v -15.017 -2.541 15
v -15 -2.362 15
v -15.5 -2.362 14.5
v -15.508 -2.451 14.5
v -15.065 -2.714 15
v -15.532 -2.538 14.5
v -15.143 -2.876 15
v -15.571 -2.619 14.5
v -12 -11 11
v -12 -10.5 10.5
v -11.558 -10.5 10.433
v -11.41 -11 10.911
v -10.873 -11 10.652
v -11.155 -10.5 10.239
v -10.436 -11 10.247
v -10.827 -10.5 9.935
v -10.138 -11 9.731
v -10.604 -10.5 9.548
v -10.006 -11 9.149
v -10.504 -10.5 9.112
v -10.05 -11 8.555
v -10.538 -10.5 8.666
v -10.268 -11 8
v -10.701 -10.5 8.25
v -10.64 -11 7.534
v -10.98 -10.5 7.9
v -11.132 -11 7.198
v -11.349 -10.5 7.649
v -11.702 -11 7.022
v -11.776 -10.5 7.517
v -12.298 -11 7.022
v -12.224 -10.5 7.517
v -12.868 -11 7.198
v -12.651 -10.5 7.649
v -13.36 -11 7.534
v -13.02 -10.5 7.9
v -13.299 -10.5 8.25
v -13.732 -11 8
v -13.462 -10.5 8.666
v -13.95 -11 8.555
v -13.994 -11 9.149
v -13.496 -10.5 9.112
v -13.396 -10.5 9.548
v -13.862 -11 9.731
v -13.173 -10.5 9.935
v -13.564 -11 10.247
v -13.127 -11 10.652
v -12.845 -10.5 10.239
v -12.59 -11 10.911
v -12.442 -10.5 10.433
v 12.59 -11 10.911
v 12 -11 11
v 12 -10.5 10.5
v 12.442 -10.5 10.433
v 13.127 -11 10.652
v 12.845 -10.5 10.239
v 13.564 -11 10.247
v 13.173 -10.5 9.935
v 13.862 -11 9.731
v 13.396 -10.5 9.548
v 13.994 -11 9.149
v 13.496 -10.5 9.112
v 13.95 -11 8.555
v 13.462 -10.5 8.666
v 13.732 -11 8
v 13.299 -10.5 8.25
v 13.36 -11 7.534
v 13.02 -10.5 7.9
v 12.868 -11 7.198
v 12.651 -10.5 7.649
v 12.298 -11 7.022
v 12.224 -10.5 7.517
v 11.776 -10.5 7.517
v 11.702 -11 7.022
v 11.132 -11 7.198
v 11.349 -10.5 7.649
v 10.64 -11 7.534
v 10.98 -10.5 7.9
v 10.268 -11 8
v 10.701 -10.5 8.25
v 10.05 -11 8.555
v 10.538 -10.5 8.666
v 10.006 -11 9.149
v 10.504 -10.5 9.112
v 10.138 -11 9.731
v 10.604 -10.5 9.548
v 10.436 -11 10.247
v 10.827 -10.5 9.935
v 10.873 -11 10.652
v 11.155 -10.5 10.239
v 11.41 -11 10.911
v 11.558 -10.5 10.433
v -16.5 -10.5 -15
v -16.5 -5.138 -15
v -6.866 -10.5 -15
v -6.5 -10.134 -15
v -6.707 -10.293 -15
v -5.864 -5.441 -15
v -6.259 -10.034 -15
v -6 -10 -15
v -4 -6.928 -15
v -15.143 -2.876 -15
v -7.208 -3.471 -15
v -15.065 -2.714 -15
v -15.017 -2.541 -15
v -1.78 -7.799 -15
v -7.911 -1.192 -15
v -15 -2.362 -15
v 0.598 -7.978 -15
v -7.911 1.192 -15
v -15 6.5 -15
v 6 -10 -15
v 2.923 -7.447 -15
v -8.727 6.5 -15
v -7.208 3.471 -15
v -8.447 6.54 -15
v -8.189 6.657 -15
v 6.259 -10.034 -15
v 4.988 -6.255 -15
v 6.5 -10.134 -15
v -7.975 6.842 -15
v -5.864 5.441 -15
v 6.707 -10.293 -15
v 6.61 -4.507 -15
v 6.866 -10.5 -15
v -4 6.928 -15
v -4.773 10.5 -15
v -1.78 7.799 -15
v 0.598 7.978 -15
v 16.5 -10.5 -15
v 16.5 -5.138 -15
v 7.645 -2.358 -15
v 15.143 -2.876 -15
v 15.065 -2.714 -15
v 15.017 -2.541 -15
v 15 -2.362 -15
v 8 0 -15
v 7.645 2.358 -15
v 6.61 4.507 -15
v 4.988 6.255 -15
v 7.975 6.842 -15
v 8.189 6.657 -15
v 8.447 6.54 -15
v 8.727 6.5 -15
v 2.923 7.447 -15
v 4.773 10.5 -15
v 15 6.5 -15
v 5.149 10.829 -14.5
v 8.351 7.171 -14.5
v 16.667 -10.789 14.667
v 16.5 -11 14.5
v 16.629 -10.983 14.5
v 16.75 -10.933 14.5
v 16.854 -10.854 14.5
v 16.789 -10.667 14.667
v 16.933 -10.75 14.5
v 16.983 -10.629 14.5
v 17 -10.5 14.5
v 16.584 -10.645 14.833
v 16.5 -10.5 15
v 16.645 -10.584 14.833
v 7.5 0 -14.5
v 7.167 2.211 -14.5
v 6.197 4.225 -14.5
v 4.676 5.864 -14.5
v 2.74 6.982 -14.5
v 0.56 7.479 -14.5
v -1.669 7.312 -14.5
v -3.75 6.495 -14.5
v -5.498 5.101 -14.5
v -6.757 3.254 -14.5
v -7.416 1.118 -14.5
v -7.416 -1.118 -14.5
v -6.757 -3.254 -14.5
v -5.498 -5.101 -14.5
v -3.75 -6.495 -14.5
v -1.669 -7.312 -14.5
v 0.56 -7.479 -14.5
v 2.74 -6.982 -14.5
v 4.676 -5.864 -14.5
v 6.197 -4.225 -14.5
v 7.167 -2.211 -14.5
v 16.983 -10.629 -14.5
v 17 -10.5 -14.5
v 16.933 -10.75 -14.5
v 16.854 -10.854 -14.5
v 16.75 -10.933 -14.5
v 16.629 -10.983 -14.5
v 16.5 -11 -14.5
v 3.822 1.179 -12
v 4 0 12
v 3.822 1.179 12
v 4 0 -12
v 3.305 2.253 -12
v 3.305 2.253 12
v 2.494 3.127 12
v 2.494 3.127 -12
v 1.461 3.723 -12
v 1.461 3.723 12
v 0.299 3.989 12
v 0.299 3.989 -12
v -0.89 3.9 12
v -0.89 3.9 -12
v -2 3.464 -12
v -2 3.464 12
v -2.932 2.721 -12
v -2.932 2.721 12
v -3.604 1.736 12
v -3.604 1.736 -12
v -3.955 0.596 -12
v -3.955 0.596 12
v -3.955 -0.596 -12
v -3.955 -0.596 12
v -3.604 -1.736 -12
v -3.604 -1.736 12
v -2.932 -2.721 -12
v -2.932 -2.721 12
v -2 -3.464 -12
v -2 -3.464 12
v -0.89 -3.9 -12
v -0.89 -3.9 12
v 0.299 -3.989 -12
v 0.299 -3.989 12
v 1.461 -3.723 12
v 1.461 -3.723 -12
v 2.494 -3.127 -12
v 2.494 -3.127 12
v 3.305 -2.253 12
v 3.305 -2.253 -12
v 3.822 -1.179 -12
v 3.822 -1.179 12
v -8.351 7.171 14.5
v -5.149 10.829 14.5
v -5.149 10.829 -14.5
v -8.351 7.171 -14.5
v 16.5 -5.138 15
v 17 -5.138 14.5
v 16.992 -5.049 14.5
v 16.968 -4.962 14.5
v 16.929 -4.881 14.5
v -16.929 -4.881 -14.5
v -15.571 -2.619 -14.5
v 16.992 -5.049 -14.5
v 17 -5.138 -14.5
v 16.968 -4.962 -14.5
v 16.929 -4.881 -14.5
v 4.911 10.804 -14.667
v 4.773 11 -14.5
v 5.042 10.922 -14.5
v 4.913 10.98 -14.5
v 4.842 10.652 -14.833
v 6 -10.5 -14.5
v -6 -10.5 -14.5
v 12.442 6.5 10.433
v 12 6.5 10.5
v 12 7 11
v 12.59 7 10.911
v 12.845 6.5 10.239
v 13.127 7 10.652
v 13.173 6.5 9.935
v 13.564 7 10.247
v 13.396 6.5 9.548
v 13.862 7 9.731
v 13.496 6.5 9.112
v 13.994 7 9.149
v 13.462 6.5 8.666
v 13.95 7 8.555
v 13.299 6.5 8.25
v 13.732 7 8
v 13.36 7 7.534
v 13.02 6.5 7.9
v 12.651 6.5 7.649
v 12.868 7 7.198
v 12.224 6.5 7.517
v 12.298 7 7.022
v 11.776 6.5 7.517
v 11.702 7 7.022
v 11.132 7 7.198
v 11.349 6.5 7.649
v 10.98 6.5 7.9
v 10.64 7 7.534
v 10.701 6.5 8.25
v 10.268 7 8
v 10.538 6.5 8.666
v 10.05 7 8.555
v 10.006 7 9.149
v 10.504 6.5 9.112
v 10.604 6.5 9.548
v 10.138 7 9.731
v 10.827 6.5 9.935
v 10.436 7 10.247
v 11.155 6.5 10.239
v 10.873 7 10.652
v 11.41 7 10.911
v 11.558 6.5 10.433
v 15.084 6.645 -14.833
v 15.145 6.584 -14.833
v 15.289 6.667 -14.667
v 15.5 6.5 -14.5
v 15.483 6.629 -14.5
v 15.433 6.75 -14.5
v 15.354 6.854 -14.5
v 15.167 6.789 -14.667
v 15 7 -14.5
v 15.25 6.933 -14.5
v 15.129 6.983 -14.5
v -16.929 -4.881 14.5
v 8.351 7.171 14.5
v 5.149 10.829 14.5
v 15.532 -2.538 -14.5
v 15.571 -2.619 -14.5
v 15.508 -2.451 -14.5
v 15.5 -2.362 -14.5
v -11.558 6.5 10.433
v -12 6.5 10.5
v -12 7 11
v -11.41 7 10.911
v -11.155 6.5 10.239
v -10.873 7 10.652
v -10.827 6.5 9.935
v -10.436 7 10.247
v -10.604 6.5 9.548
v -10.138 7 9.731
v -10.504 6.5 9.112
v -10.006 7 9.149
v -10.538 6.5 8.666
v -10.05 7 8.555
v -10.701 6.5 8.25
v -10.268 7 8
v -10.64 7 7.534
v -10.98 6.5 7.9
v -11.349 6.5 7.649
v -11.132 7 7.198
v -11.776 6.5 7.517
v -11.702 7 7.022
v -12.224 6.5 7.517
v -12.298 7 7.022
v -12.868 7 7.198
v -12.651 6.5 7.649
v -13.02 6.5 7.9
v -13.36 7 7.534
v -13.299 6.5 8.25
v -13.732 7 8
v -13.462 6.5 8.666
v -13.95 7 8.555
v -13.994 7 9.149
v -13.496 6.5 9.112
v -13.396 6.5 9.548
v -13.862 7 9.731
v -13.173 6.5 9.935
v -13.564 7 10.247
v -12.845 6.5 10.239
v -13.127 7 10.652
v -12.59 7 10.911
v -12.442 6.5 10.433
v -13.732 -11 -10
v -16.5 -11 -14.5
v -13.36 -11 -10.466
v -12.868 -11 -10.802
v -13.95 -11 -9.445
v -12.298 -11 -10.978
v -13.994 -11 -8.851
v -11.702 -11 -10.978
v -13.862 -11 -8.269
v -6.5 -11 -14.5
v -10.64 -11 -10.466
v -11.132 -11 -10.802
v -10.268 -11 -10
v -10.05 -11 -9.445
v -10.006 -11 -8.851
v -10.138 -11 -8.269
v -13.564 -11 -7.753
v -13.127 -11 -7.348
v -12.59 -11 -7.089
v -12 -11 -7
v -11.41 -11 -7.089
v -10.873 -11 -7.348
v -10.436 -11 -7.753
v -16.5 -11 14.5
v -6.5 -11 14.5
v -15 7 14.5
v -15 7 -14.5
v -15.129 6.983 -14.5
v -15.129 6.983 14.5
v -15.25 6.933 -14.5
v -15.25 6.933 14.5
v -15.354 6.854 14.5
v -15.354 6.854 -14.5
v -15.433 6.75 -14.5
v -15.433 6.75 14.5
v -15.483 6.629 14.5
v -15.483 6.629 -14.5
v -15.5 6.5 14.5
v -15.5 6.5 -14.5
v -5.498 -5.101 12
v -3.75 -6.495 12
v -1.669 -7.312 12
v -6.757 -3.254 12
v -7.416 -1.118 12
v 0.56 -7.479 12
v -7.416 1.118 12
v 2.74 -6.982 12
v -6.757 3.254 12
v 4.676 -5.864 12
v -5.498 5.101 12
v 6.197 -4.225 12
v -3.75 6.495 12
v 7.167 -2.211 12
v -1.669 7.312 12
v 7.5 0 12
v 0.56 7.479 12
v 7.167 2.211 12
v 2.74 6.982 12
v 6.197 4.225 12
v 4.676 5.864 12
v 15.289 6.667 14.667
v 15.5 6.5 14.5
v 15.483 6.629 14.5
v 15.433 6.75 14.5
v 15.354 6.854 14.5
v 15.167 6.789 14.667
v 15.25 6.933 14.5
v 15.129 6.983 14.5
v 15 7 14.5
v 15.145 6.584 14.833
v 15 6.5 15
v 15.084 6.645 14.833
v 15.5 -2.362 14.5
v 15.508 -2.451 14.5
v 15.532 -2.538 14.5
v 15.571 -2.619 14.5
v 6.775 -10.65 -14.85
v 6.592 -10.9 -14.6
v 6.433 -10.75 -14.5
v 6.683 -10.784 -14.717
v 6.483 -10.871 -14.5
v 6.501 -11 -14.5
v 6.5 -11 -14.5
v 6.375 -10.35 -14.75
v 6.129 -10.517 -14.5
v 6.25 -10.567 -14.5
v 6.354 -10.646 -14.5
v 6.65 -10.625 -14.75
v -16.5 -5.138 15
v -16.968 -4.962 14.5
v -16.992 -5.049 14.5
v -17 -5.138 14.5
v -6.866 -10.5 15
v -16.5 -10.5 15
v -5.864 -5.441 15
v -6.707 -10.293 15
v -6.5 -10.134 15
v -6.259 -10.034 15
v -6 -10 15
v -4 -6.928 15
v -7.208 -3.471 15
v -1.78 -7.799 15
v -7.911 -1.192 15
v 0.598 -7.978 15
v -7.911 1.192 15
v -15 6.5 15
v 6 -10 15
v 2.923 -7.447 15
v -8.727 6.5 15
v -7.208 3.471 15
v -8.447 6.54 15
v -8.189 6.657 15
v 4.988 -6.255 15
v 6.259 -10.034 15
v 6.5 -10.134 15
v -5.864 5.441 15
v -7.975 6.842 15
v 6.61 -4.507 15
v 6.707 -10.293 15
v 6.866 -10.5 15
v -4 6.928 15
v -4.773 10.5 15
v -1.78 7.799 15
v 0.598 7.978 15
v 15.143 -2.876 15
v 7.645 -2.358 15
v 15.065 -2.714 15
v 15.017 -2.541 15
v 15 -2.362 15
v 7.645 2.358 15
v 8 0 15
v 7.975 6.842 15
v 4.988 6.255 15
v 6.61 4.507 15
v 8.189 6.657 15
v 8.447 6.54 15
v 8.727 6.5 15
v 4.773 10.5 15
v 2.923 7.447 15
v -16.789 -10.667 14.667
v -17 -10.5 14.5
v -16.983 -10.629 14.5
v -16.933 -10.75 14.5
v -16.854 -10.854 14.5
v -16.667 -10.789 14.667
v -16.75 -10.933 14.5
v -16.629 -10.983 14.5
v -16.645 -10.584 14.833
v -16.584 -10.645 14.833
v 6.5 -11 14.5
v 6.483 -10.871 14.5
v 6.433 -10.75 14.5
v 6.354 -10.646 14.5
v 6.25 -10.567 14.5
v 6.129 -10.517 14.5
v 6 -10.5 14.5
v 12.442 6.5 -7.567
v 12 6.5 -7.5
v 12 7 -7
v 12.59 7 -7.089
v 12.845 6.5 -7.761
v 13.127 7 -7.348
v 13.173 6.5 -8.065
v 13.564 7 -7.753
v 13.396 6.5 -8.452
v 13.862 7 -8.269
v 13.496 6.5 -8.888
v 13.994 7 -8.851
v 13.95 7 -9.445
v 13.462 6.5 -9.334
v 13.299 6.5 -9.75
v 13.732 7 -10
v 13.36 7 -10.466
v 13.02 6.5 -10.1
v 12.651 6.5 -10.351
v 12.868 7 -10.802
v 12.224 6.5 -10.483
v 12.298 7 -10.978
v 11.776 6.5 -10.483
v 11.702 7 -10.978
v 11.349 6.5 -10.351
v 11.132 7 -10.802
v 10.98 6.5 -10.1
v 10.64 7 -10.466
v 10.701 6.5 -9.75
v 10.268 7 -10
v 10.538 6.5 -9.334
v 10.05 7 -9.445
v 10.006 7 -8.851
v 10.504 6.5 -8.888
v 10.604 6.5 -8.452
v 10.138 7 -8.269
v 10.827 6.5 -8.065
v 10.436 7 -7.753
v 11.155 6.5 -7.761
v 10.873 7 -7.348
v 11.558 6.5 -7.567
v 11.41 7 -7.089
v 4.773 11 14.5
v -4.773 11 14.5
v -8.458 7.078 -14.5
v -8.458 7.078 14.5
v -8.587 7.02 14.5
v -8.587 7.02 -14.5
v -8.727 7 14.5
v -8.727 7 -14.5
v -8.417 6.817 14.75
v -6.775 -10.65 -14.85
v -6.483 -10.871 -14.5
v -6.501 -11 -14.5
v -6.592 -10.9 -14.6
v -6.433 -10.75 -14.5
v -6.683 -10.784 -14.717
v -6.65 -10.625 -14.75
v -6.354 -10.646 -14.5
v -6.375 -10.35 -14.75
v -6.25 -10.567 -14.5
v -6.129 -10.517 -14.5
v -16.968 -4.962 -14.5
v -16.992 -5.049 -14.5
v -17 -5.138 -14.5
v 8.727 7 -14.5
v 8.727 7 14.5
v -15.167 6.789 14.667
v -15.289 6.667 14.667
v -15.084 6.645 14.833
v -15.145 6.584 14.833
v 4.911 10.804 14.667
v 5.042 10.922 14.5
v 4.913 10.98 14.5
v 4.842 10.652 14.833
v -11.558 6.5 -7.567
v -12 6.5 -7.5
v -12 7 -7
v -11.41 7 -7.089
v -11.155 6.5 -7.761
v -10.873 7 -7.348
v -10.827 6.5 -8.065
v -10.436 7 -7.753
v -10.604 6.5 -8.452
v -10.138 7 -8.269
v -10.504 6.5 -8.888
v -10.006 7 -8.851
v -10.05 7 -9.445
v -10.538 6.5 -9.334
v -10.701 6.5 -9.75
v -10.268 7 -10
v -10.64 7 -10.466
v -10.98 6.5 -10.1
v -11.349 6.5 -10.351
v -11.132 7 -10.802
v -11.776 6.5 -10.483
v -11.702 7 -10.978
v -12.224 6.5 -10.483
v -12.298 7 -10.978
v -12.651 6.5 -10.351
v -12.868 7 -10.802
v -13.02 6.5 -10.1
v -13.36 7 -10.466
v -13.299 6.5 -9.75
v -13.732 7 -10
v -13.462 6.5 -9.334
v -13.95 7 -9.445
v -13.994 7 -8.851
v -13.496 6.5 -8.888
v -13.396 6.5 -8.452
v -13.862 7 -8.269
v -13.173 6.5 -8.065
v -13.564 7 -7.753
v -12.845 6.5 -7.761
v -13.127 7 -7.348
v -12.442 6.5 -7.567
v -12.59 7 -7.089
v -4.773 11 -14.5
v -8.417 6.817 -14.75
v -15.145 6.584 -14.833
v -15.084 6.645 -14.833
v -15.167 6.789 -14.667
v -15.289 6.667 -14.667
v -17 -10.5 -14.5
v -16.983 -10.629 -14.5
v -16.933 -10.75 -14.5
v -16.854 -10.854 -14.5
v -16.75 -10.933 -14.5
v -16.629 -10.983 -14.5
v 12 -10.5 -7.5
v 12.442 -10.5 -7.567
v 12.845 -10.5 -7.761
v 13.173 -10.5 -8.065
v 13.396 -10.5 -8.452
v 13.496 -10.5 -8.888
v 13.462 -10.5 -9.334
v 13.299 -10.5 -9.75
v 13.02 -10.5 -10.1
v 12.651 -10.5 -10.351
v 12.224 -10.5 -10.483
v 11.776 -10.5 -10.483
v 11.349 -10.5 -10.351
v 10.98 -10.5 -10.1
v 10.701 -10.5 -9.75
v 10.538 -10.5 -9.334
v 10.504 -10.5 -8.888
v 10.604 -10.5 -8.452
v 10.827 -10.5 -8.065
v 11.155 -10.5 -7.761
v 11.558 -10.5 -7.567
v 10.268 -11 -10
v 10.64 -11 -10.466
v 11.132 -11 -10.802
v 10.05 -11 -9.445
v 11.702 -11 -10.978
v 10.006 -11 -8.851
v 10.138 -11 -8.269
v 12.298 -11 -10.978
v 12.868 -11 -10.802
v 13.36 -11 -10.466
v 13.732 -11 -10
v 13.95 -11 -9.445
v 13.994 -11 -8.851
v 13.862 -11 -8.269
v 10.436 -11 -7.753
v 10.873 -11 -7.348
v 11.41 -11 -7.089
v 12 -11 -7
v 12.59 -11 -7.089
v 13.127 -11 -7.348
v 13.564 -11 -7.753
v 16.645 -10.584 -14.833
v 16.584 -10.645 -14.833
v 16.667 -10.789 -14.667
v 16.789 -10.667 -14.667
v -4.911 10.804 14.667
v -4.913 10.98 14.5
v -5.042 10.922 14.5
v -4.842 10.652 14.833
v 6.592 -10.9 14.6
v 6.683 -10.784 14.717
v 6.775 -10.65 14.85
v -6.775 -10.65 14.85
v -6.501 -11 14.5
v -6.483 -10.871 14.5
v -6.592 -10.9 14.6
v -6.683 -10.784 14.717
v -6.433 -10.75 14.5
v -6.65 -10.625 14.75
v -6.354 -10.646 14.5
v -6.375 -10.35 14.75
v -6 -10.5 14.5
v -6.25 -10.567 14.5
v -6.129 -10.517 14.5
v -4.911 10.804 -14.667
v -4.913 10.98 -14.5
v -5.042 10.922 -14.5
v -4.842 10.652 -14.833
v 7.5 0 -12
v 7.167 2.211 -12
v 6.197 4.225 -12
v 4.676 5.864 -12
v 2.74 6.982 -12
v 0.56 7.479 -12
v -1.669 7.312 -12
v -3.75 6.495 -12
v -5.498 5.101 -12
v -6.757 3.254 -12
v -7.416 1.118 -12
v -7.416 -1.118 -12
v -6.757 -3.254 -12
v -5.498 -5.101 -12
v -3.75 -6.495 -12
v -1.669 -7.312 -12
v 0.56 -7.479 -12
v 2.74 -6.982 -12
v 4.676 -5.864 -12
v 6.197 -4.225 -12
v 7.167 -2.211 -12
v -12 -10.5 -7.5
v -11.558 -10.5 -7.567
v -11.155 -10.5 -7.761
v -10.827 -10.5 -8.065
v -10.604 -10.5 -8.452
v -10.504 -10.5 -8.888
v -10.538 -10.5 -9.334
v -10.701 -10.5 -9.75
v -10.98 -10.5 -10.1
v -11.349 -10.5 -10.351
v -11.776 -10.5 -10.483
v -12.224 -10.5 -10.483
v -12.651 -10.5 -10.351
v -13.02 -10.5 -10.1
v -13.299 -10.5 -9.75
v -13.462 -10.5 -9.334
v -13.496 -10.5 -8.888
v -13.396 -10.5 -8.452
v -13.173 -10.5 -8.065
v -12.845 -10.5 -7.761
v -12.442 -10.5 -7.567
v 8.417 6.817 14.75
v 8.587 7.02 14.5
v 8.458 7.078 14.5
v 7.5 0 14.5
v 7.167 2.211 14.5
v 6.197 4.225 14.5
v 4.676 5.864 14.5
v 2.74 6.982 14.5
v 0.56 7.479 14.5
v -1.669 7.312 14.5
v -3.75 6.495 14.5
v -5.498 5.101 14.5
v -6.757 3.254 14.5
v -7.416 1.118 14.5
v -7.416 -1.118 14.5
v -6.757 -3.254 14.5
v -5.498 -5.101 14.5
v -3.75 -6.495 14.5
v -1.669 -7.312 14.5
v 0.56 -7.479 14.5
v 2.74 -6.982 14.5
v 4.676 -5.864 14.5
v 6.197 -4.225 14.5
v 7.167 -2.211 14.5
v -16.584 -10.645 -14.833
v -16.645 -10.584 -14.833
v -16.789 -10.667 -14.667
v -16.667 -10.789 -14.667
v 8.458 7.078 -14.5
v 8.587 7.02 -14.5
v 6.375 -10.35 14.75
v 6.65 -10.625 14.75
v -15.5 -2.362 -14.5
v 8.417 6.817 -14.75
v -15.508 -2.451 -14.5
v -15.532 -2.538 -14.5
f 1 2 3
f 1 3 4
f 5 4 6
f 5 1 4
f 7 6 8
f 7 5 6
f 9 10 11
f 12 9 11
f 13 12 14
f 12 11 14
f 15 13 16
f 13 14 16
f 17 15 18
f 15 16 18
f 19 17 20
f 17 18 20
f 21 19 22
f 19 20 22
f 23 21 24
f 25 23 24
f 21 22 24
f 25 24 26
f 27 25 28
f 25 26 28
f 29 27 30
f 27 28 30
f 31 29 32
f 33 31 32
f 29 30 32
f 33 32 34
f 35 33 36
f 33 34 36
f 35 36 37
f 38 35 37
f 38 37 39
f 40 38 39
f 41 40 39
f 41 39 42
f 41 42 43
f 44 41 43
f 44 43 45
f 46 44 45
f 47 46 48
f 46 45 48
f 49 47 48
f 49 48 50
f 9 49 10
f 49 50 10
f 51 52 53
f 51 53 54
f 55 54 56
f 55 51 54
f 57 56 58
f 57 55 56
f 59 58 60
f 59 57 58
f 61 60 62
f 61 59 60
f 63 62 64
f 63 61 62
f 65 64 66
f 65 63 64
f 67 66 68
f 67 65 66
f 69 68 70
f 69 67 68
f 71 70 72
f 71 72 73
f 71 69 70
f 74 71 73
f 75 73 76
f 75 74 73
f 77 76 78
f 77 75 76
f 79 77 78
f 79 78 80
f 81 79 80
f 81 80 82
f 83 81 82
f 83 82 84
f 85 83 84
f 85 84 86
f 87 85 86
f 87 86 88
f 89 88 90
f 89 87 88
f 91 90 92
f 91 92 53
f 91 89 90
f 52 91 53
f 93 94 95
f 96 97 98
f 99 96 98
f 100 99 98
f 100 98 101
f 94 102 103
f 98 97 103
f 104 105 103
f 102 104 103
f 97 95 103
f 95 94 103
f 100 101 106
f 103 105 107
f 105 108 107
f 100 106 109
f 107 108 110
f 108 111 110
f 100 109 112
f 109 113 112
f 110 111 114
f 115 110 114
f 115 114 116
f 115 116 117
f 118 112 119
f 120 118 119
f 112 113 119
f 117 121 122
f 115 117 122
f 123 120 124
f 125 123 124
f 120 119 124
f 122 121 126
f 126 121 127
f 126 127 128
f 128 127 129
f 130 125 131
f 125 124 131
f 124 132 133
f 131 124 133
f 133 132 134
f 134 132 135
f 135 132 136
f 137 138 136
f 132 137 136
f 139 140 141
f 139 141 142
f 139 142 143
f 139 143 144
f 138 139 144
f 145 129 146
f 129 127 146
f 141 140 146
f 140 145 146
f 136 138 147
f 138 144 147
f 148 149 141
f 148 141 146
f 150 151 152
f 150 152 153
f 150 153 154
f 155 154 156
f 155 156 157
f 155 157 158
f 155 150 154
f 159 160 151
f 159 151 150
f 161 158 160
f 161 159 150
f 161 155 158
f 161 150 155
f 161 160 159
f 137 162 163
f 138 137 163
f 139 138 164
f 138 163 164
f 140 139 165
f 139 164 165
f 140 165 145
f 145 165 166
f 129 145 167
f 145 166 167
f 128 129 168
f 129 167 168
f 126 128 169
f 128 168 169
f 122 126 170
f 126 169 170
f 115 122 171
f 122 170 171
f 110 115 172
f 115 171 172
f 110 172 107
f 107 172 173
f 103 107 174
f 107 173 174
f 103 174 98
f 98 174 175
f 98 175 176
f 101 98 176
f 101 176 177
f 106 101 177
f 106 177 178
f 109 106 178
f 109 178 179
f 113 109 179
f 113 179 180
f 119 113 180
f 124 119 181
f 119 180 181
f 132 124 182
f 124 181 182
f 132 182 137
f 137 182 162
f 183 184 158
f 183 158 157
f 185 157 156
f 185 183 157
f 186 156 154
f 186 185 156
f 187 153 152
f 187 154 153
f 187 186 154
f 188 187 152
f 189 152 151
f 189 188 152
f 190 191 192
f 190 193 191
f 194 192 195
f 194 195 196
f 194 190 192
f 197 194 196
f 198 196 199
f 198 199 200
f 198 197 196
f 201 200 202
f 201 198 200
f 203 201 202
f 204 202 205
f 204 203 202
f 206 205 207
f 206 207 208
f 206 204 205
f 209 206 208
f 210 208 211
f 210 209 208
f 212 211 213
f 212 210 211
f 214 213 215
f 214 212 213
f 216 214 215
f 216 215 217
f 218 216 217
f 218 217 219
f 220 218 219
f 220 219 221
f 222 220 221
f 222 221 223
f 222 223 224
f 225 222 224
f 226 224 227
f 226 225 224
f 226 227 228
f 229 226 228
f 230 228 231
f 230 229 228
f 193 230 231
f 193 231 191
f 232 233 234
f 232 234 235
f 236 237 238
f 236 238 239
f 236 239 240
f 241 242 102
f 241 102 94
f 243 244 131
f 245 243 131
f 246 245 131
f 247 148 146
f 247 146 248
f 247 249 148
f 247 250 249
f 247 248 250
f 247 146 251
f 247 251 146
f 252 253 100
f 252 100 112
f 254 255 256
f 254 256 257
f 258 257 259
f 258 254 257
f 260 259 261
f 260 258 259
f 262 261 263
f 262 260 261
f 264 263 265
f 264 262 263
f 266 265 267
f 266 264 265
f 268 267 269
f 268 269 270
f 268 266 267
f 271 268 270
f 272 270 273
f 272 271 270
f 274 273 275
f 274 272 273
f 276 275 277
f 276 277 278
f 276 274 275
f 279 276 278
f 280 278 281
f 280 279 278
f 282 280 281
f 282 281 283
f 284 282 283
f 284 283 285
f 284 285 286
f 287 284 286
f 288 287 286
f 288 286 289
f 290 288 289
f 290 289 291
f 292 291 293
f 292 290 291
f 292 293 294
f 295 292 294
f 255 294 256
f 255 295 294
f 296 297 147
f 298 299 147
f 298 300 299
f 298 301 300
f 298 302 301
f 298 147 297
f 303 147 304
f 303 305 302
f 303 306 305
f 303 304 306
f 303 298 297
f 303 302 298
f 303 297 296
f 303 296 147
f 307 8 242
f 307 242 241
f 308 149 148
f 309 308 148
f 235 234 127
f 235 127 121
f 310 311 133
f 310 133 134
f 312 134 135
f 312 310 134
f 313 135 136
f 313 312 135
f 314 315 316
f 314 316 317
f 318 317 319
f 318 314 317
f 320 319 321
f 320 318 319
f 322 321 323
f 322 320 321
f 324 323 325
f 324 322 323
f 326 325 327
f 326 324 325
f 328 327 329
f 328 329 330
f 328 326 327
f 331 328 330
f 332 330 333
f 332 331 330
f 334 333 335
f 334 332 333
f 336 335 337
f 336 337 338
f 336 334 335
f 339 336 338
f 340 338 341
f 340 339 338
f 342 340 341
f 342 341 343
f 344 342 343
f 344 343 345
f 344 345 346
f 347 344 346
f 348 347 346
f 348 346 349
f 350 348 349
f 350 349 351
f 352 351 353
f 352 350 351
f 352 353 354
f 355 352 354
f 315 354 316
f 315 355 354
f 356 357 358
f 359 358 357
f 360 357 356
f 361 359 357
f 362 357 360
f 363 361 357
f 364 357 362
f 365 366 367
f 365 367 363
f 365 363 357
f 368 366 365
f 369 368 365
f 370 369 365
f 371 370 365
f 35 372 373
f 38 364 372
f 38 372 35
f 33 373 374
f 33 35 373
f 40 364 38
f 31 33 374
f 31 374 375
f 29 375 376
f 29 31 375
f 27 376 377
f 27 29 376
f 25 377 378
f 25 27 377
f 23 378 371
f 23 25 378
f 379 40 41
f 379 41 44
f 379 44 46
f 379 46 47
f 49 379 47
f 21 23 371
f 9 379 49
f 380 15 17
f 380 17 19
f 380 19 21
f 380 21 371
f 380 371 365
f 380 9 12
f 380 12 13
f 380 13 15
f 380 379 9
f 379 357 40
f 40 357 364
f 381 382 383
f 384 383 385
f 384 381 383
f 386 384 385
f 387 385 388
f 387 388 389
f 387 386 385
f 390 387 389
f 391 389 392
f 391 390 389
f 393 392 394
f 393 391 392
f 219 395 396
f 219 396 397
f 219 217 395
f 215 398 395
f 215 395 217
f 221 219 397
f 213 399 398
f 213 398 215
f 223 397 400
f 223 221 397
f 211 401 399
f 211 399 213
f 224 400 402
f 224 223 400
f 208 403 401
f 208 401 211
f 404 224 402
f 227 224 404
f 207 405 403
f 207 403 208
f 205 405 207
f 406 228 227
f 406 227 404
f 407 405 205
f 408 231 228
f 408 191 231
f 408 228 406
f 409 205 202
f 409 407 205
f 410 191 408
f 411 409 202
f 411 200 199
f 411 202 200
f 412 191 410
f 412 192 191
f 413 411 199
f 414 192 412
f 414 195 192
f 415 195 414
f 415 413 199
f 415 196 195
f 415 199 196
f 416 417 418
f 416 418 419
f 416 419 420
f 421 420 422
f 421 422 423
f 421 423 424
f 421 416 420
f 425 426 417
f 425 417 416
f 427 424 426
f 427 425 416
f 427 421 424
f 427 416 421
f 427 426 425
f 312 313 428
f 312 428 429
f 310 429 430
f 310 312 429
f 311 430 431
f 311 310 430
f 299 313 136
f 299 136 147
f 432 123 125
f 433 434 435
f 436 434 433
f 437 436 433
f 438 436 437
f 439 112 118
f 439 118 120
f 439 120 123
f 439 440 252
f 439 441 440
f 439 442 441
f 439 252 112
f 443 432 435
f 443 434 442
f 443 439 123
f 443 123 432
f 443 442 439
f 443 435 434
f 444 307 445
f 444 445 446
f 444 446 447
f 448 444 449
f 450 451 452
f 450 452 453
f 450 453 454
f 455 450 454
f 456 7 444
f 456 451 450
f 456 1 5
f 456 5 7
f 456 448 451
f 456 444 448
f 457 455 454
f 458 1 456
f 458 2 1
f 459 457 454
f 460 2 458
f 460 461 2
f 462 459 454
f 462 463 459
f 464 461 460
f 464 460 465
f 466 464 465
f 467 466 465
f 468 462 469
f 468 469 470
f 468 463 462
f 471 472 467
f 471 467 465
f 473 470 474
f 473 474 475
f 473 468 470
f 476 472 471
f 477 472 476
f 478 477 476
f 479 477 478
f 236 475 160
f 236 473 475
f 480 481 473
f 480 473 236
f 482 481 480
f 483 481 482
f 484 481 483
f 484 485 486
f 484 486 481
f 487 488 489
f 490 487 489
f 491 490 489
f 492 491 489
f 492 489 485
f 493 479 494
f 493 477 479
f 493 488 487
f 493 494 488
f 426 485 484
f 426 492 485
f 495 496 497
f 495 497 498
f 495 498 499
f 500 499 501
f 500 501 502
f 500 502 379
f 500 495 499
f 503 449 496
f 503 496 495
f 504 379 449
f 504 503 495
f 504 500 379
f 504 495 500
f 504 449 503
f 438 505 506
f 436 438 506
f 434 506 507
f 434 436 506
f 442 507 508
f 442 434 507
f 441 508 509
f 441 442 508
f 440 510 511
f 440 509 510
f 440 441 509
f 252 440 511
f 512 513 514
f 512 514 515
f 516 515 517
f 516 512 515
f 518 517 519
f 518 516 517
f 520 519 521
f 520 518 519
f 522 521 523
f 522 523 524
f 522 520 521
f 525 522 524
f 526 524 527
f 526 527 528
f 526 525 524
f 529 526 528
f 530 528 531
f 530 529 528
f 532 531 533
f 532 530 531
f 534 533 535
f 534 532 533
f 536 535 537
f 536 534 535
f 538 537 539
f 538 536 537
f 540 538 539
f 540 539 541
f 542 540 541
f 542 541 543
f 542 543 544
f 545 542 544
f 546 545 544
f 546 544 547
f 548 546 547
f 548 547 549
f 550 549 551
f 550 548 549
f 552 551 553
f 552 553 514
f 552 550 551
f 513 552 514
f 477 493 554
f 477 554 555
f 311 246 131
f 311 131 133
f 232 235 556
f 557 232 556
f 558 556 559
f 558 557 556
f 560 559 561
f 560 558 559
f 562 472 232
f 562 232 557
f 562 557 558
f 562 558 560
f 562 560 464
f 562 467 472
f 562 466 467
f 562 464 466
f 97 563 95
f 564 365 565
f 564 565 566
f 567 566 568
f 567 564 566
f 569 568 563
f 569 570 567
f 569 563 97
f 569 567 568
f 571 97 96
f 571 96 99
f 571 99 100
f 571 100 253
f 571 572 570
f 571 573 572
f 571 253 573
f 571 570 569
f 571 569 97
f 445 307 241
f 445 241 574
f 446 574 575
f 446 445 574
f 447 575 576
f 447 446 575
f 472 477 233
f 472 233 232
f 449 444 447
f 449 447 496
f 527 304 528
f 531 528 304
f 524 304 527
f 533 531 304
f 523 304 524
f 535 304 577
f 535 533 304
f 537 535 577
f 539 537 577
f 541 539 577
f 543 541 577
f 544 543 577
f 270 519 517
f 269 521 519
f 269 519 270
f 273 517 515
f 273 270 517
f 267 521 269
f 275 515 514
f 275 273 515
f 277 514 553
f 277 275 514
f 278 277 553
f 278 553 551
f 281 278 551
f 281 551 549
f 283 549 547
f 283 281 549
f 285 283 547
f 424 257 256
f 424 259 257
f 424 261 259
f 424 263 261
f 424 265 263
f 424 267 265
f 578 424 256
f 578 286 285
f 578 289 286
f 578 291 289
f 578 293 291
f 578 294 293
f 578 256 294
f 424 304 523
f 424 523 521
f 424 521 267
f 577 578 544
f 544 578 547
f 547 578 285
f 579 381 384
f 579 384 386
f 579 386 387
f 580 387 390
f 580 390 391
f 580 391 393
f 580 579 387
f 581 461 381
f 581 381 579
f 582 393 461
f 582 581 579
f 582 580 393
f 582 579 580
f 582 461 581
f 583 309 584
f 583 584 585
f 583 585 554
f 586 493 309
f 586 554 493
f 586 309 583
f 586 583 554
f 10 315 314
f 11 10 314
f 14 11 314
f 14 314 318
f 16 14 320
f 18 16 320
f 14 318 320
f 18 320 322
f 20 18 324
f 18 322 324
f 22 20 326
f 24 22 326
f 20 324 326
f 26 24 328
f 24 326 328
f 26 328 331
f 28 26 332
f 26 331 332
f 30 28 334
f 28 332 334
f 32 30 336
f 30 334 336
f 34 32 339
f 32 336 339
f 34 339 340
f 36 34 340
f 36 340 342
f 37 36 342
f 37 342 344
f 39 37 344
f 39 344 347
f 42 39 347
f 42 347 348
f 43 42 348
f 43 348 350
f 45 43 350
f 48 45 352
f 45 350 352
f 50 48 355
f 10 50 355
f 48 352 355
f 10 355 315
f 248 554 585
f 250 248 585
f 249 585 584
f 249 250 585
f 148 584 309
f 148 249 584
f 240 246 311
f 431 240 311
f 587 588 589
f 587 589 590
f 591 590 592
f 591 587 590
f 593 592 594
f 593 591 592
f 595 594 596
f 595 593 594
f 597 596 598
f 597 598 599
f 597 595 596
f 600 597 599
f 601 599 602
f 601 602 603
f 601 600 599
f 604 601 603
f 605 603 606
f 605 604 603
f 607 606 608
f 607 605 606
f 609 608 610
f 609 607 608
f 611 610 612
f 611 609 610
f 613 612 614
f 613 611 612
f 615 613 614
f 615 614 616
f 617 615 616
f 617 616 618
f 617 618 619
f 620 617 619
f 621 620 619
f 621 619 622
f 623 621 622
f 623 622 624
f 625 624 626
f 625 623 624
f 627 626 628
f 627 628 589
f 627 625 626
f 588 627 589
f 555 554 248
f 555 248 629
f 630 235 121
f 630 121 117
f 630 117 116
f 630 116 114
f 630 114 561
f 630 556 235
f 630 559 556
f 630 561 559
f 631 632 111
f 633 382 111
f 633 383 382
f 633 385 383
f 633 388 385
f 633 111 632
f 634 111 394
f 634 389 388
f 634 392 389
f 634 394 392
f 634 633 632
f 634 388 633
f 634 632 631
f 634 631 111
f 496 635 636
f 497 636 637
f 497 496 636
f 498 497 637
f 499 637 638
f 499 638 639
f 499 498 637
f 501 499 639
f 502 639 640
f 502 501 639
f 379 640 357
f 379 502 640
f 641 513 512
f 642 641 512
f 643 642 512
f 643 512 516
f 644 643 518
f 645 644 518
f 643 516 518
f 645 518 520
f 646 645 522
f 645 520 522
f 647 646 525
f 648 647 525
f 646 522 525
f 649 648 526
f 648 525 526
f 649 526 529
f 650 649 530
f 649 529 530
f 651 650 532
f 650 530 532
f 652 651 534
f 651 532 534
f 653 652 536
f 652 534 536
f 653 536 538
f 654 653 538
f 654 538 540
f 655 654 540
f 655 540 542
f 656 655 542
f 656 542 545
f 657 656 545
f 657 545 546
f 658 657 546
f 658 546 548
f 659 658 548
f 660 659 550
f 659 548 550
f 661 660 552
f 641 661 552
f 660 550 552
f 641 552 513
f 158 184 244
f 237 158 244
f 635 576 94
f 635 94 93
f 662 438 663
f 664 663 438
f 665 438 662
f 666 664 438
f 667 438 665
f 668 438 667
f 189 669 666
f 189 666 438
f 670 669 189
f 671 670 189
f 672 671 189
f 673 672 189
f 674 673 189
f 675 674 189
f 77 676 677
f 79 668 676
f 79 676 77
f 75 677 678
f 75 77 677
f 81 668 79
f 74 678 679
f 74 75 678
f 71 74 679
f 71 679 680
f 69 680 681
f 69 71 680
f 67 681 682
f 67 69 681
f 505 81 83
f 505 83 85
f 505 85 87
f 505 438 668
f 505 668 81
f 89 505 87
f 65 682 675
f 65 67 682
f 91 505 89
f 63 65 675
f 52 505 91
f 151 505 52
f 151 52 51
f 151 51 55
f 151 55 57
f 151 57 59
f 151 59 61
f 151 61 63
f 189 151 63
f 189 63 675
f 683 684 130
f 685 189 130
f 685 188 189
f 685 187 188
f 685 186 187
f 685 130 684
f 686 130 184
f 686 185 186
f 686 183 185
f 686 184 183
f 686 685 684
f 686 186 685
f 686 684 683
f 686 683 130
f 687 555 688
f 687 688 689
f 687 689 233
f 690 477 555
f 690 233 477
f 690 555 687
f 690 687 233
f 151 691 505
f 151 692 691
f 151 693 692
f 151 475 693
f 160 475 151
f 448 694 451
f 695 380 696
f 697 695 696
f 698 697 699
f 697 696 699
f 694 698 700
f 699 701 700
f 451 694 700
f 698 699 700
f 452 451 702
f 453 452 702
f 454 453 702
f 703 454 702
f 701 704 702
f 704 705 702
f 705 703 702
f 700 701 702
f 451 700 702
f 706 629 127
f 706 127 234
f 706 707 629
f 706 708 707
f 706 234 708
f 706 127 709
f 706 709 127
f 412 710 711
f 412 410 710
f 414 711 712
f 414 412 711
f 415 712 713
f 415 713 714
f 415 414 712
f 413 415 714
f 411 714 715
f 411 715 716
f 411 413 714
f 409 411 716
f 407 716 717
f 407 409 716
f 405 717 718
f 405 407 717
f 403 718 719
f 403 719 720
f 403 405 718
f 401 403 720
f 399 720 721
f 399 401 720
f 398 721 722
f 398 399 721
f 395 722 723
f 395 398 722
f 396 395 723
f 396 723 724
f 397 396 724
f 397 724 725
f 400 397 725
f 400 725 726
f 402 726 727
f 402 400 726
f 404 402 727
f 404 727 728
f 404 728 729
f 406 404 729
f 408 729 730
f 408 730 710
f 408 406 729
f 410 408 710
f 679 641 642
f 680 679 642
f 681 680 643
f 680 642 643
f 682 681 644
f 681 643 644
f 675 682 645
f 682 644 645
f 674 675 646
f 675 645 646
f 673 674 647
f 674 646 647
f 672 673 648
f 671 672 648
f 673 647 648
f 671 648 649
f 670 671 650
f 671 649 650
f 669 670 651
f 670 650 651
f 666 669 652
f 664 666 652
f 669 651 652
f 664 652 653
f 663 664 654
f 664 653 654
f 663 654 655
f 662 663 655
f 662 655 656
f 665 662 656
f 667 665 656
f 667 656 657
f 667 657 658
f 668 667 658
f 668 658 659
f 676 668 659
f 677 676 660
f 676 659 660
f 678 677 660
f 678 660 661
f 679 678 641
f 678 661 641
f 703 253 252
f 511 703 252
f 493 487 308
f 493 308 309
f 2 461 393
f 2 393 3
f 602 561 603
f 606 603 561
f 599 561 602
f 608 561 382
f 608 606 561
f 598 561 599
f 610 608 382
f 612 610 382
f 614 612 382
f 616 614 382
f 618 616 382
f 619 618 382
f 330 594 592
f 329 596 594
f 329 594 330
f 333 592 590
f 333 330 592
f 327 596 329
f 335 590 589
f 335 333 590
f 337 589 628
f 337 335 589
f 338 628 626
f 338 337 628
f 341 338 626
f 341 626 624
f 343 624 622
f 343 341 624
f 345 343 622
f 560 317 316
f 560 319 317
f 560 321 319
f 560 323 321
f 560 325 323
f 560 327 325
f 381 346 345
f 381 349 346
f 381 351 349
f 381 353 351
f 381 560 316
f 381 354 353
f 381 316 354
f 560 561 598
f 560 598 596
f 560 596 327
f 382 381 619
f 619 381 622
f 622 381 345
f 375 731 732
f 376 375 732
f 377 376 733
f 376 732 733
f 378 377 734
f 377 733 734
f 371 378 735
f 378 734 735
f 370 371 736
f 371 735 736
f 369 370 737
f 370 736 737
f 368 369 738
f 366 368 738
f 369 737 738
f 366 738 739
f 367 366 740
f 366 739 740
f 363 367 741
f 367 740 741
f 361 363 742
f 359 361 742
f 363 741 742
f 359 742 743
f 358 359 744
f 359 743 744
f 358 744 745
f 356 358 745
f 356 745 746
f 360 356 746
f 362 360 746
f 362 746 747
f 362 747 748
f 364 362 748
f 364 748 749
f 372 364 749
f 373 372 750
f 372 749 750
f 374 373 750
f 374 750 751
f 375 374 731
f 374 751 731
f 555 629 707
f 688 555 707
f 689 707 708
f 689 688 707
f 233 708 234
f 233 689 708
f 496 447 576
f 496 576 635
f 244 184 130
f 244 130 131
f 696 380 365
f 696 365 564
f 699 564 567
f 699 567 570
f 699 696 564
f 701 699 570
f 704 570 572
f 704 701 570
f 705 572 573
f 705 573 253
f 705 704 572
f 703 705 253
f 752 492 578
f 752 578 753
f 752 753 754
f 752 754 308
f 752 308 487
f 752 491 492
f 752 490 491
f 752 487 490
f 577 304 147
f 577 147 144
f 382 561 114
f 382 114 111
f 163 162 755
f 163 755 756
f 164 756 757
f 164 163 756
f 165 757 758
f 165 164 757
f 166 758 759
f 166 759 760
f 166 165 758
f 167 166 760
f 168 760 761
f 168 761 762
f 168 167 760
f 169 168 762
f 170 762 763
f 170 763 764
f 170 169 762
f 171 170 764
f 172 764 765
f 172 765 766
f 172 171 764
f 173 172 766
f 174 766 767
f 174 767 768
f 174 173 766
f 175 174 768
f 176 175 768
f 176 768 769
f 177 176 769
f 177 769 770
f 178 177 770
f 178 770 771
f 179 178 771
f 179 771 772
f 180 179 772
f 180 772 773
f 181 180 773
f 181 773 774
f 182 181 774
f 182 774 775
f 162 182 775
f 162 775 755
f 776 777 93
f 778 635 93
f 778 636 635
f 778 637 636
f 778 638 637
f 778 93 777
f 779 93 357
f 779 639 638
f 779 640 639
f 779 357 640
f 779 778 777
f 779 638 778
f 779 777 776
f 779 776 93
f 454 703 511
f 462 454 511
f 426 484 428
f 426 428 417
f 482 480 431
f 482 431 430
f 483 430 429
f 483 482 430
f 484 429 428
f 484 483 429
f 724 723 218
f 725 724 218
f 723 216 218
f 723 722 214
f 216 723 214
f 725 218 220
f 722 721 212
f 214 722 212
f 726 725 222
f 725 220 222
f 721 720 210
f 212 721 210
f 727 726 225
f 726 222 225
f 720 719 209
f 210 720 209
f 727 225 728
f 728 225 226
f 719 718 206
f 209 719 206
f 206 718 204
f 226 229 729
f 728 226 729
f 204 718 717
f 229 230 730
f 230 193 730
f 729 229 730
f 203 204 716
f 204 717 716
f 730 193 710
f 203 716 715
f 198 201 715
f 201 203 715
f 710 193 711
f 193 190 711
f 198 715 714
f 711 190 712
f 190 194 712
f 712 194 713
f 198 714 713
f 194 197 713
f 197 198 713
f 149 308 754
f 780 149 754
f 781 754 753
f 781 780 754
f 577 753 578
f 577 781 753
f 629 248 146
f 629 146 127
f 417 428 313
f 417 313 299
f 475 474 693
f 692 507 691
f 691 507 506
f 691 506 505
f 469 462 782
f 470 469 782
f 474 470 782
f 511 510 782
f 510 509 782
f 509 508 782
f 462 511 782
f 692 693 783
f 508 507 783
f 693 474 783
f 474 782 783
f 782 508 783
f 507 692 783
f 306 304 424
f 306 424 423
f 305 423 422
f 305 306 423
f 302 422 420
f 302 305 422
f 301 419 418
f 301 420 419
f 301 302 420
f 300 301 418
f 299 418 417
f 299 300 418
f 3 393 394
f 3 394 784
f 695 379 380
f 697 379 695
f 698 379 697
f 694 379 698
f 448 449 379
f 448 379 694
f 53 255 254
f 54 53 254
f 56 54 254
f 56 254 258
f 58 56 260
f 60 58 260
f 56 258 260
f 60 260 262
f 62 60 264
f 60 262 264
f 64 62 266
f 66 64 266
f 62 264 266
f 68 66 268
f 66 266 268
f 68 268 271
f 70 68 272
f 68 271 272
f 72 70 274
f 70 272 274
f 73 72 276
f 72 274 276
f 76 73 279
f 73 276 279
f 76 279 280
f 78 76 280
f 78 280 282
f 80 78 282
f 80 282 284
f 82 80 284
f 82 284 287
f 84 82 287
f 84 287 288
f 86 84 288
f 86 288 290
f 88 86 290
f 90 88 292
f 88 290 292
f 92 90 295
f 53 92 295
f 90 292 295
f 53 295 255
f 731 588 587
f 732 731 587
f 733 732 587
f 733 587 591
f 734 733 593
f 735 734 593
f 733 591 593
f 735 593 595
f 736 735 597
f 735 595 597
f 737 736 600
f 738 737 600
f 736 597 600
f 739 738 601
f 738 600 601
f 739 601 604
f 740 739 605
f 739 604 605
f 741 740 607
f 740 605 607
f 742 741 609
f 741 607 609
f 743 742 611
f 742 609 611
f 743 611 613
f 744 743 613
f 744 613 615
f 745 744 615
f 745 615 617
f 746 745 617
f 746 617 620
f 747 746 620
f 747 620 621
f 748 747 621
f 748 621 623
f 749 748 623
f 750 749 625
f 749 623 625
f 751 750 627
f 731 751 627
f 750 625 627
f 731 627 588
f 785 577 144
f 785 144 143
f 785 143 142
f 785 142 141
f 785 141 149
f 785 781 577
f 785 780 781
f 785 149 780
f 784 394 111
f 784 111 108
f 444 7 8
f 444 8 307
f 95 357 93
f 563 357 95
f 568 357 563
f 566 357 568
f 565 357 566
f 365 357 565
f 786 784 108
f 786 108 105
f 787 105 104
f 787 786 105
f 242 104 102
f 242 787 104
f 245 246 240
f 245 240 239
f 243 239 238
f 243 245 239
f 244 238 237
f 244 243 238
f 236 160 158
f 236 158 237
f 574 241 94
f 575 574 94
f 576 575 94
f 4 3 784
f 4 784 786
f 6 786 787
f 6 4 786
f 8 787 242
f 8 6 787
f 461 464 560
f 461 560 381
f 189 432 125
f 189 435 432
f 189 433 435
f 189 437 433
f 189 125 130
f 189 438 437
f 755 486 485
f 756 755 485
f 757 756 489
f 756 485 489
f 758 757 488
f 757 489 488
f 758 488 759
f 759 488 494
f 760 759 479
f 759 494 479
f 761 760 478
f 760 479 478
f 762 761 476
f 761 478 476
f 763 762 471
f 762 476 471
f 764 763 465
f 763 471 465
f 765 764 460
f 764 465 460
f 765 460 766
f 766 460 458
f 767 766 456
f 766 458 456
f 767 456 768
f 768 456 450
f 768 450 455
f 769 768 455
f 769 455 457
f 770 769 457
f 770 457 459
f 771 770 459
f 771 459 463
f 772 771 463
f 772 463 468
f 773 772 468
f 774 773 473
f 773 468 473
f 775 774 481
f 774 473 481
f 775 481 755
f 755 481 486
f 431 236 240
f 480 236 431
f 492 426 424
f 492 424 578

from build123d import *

# Parameters (mm, degrees)
SKETCH2_R           = 7.5
BOSS_EXTRUDE1_DEPTH = 15
SKETCH3_R           = 7.5
SKETCH3_R_2         = 4
BOSS_EXTRUDE2_DEPTH = 12
SKETCH4_R           = 1.5
CUT_EXTRUDE1_DEPTH  = 18
FILLET1_R           = 0.5
CHAMFER1_SIZE       = 0.5


with BuildPart() as part:
    # Sketch2 → Boss-Extrude1 (new, symmetric)
    with BuildSketch(Plane.XY):
        Polygon((5, 11), (-5, 11), (-8.5, 7), (-15.5, 7), (-15.5, -2.5), (-17, -5), (-17, -11), (-6.5, -11), (-6.5, -10.5), (6.5, -10.5), (6.5, -11), (17, -11), (17, -5), (15.5, -2.5), (15.5, 7), (8.5, 7), align=None)
        Circle(SKETCH2_R, mode=Mode.SUBTRACT)
    extrude(amount=BOSS_EXTRUDE1_DEPTH, both=True)

    # Sketch4 → Cut-Extrude1 (cut)
    with BuildSketch(Plane(origin=(0, 7, 0), x_dir=(1, 0, 0), z_dir=(0, 1, 0))):
        with Locations(Location((-12, 9, 0), (0, 0, 270))):
            Circle(SKETCH4_R)
        with Locations(Location((12, 9, 0), (0, 0, 270))):
            Circle(SKETCH4_R)
        with Locations(Location((-12, -9, 0), (0, 0, 270))):
            Circle(SKETCH4_R)
        with Locations(Location((12, -9, 0), (0, 0, 270))):
            Circle(SKETCH4_R)
    extrude(amount=-CUT_EXTRUDE1_DEPTH, mode=Mode.SUBTRACT)

    # Fillet1
    fillet1_edges = [part.edges().sort_by_distance(p)[0] for p in [
        (6.5, -10.5, 0),
        (-6.5, -10.5, 0),
        (-17, -11, 0),
        (-17, -5, 0),
        (-15.5, -2.5, 0),
        (-15.5, 7, 0),
        (-8.5, 7, 0),
        (-5, 11, 0),
        (5, 11, 0),
        (8.5, 7, 0),
        (17, -11, 0),
        (17, -5, 0),
        (15.5, -2.5, 0),
        (15.5, 7, 0),
    ]]
    fillet(fillet1_edges, radius=FILLET1_R - 0.0001)  # a hair under: the kernel refuses the full size

    # Chamfer1
    chamfer1_edges = [part.edges().sort_by_distance(p)[0] for p in [
        (12, 7, 7.5),
    ]]
    chamfer(chamfer1_edges, length=CHAMFER1_SIZE)
    chamfer1_2_edges = [part.edges().sort_by_distance(p)[0] for p in [
        (12, -11, 7.5),
    ]]
    chamfer(chamfer1_2_edges, length=CHAMFER1_SIZE)
    chamfer1_3_edges = [part.edges().sort_by_distance(p)[0] for p in [
        (12, 7, -10.5),
    ]]
    chamfer(chamfer1_3_edges, length=CHAMFER1_SIZE)
    chamfer1_4_edges = [part.edges().sort_by_distance(p)[0] for p in [
        (-12, 7, -10.5),
    ]]
    chamfer(chamfer1_4_edges, length=CHAMFER1_SIZE)
    chamfer1_5_edges = [part.edges().sort_by_distance(p)[0] for p in [
        (-12, 7, 7.5),
    ]]
    chamfer(chamfer1_5_edges, length=CHAMFER1_SIZE)
    chamfer1_6_edges = [part.edges().sort_by_distance(p)[0] for p in [
        (12, -11, -10.5),
    ]]
    chamfer(chamfer1_6_edges, length=CHAMFER1_SIZE)
    chamfer1_7_edges = [part.edges().sort_by_distance(p)[0] for p in [
        (-12, -11, -10.5),
    ]]
    chamfer(chamfer1_7_edges, length=CHAMFER1_SIZE)
    chamfer1_8_edges = [part.edges().sort_by_distance(p)[0] for p in [
        (-12, -11, 7.5),
    ]]
    chamfer(chamfer1_8_edges, length=CHAMFER1_SIZE)
    chamfer1_9_edges = [part.edges().sort_by_distance(p)[0] for p in [
        (6.5, -10.99995, -15),
        (-6.5, -10.99995, -15),
        (6.35358268, -10.64641732, -15),
        (-6.35358268, -10.64641732, -15),
        (0, -10.5, -15),
    ]]
    chamfer(chamfer1_9_edges, length=CHAMFER1_SIZE)
    chamfer1_10_edges = [part.edges().sort_by_distance(p)[0] for p in [
        (6.5, -10.99995, 15),
        (-6.5, -10.99995, 15),
        (6.35358268, -10.64641732, 15),
        (-6.35358268, -10.64641732, 15),
        (0, -10.5, 15),
    ]]
    chamfer(chamfer1_10_edges, length=CHAMFER1_SIZE)
    chamfer1_11_edges = [part.edges().sort_by_distance(p)[0] for p in [
        (-7.5, 0, -15),
    ]]
    chamfer(chamfer1_11_edges, length=CHAMFER1_SIZE)
    chamfer1_12_edges = [part.edges().sort_by_distance(p)[0] for p in [
        (-7.5, 0, 15),
    ]]
    chamfer(chamfer1_12_edges, length=CHAMFER1_SIZE)
    chamfer1_13_edges = [part.edges().sort_by_distance(p)[0] for p in [
        (0, 11, -15),
        (4.979728083, 10.955325394, -15),
        (-4.979728083, 10.955325394, -15),
        (6.75, 9, -15),
        (-6.75, 9, -15),
        (8.520271917, 7.044674606, -15),
        (-8.520271917, 7.044674606, -15),
        (11.863469368, 7, -15),
        (-11.863469368, 7, -15),
        (15.35358268, 6.85358268, -15),
        (-15.35358268, 6.85358268, -15),
        (15.5, 2.069282142, -15),
        (-15.5, 2.069282142, -15),
        (15.518138907, -2.494975814, -15),
        (-15.518138907, -2.494975814, -15),
        (16.25, -3.75, -15),
        (-16.25, -3.75, -15),
        (16.981861093, -5.005024186, -15),
        (-16.981861093, -5.005024186, -15),
        (17, -7.819282142, -15),
        (-17, -7.819282142, -15),
        (16.85358268, -10.85358268, -15),
        (-16.85358268, -10.85358268, -15),
        (11.75005, -11, -15),
        (-11.75005, -11, -15),
    ]]
    chamfer(chamfer1_13_edges, length=CHAMFER1_SIZE - 0.0004)  # a hair under: the kernel refuses the full size
    chamfer1_14_edges = [part.edges().sort_by_distance(p)[0] for p in [
        (0, 11, 15),
        (4.979728083, 10.955325394, 15),
        (-4.979728083, 10.955325394, 15),
        (6.75, 9, 15),
        (-6.75, 9, 15),
        (8.520271917, 7.044674606, 15),
        (-8.520271917, 7.044674606, 15),
        (11.863469368, 7, 15),
        (-11.863469368, 7, 15),
        (15.35358268, 6.85358268, 15),
        (-15.35358268, 6.85358268, 15),
        (15.5, 2.069282142, 15),
        (-15.5, 2.069282142, 15),
        (15.518138907, -2.494975814, 15),
        (-15.518138907, -2.494975814, 15),
        (16.25, -3.75, 15),
        (-16.25, -3.75, 15),
        (16.981861093, -5.005024186, 15),
        (-16.981861093, -5.005024186, 15),
        (17, -7.819282142, 15),
        (-17, -7.819282142, 15),
        (16.85358268, -10.85358268, 15),
        (-16.85358268, -10.85358268, 15),
        (11.75005, -11, 15),
        (-11.75005, -11, 15),
    ]]
    chamfer(chamfer1_14_edges, length=CHAMFER1_SIZE - 0.0004)  # a hair under: the kernel refuses the full size


with BuildPart() as body_2:
    # Sketch3 → Boss-Extrude2 (new, symmetric)
    with BuildSketch(Plane.XY):
        Circle(SKETCH3_R)
        Circle(SKETCH3_R_2, mode=Mode.SUBTRACT)
    extrude(amount=BOSS_EXTRUDE2_DEPTH, both=True)


solid = Compound([part.part, body_2.part])
